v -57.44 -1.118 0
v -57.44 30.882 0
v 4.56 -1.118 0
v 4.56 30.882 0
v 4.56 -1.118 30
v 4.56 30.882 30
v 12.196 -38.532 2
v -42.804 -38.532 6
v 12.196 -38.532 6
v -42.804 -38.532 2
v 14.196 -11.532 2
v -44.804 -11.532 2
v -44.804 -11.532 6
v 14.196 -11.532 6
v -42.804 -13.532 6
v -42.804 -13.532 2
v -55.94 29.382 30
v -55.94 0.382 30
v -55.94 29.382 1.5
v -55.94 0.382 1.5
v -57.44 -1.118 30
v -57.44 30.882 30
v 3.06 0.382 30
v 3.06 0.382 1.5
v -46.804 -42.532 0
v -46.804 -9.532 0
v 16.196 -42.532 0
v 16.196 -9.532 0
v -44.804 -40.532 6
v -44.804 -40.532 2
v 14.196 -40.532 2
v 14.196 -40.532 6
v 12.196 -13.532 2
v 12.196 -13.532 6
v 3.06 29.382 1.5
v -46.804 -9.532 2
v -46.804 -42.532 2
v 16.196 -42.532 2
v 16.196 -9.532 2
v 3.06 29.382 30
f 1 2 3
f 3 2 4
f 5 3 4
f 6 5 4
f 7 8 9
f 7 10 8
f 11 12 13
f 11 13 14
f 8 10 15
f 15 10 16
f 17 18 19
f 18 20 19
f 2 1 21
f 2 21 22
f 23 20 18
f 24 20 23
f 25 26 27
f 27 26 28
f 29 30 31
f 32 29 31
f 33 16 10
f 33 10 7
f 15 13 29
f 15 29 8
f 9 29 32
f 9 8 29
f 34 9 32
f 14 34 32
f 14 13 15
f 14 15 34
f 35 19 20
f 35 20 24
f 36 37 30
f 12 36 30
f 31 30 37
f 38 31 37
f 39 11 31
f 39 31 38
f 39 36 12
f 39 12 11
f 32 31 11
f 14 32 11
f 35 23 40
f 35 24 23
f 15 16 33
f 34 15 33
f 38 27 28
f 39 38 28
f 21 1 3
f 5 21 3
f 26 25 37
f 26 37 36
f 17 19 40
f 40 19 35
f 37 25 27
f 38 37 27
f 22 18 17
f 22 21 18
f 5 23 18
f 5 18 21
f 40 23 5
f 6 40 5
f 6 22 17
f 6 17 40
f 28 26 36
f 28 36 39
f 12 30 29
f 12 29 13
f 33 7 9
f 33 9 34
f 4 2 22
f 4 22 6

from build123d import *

# Parameters (mm, degrees)
F0_W        = 62
F0_H        = 32
F1_DEPTH    = 30
F2_T        = -1.5
F3_W        = 59
F3_H        = 29
F3_W_2      = 55
F3_H_2      = 25
F4_DEPTH    = 4
F3_W_3      = 63
F3_H_3      = 33
F4_FACE_W   = 59
F4_FACE_H   = 29
F4_FACE_W_2 = 55
F4_FACE_H_2 = 25
F5_DEPTH    = 2


with BuildPart() as f1:
    # F0 (on Top) → F1 (new body)
    with BuildSketch(Plane.XY):
        with Locations((-26.43989, 14.88154)):
            Rectangle(F0_W, F0_H)
    extrude(amount=F1_DEPTH)

    # F2
    f2_openings = [f1.faces().sort_by_distance(p)[0] for p in [
        (-26.43989, 14.88154, 30),
    ]]
    offset(amount=F2_T, openings=f2_openings)


with BuildPart() as f4:
    # F3 (on Top) → F4 (new body)
    with BuildSketch(Plane.XY):
        with Locations((-15.303554, -26.031687)):
            Rectangle(F3_W, F3_H)
        with Locations((-15.303554, -26.031687)):
            Rectangle(F3_W_2, F3_H_2, mode=Mode.SUBTRACT)
    extrude(amount=F4_DEPTH)

    # F3 (on Top) + F4_face (on face) → F5 (join)
    with BuildSketch(Plane.XY):
        with Locations((-15.303554, -26.031687)):
            Rectangle(F3_W_3, F3_H_3)
        with Locations((-15.303554, -26.031687)):
            Rectangle(F3_W, F3_H, mode=Mode.SUBTRACT)
        with Locations((-15.303554, -26.031687)):
            Rectangle(F3_W, F3_H)
        with Locations((-15.303554, -26.031687)):
            Rectangle(F3_W_2, F3_H_2, mode=Mode.SUBTRACT)
        with Locations((-15.303554, -26.031687)):
            Rectangle(F3_W_2, F3_H_2)
    with BuildSketch(Plane(origin=(-15.303554, -26.031687, 4), x_dir=(1, 0, 0), z_dir=(0, 0, 1))):
        Rectangle(F4_FACE_W, F4_FACE_H)
        Rectangle(F4_FACE_W_2, F4_FACE_H_2, mode=Mode.SUBTRACT)
    extrude(amount=F5_DEPTH)


solid = Compound([f1.part, f4.part])
